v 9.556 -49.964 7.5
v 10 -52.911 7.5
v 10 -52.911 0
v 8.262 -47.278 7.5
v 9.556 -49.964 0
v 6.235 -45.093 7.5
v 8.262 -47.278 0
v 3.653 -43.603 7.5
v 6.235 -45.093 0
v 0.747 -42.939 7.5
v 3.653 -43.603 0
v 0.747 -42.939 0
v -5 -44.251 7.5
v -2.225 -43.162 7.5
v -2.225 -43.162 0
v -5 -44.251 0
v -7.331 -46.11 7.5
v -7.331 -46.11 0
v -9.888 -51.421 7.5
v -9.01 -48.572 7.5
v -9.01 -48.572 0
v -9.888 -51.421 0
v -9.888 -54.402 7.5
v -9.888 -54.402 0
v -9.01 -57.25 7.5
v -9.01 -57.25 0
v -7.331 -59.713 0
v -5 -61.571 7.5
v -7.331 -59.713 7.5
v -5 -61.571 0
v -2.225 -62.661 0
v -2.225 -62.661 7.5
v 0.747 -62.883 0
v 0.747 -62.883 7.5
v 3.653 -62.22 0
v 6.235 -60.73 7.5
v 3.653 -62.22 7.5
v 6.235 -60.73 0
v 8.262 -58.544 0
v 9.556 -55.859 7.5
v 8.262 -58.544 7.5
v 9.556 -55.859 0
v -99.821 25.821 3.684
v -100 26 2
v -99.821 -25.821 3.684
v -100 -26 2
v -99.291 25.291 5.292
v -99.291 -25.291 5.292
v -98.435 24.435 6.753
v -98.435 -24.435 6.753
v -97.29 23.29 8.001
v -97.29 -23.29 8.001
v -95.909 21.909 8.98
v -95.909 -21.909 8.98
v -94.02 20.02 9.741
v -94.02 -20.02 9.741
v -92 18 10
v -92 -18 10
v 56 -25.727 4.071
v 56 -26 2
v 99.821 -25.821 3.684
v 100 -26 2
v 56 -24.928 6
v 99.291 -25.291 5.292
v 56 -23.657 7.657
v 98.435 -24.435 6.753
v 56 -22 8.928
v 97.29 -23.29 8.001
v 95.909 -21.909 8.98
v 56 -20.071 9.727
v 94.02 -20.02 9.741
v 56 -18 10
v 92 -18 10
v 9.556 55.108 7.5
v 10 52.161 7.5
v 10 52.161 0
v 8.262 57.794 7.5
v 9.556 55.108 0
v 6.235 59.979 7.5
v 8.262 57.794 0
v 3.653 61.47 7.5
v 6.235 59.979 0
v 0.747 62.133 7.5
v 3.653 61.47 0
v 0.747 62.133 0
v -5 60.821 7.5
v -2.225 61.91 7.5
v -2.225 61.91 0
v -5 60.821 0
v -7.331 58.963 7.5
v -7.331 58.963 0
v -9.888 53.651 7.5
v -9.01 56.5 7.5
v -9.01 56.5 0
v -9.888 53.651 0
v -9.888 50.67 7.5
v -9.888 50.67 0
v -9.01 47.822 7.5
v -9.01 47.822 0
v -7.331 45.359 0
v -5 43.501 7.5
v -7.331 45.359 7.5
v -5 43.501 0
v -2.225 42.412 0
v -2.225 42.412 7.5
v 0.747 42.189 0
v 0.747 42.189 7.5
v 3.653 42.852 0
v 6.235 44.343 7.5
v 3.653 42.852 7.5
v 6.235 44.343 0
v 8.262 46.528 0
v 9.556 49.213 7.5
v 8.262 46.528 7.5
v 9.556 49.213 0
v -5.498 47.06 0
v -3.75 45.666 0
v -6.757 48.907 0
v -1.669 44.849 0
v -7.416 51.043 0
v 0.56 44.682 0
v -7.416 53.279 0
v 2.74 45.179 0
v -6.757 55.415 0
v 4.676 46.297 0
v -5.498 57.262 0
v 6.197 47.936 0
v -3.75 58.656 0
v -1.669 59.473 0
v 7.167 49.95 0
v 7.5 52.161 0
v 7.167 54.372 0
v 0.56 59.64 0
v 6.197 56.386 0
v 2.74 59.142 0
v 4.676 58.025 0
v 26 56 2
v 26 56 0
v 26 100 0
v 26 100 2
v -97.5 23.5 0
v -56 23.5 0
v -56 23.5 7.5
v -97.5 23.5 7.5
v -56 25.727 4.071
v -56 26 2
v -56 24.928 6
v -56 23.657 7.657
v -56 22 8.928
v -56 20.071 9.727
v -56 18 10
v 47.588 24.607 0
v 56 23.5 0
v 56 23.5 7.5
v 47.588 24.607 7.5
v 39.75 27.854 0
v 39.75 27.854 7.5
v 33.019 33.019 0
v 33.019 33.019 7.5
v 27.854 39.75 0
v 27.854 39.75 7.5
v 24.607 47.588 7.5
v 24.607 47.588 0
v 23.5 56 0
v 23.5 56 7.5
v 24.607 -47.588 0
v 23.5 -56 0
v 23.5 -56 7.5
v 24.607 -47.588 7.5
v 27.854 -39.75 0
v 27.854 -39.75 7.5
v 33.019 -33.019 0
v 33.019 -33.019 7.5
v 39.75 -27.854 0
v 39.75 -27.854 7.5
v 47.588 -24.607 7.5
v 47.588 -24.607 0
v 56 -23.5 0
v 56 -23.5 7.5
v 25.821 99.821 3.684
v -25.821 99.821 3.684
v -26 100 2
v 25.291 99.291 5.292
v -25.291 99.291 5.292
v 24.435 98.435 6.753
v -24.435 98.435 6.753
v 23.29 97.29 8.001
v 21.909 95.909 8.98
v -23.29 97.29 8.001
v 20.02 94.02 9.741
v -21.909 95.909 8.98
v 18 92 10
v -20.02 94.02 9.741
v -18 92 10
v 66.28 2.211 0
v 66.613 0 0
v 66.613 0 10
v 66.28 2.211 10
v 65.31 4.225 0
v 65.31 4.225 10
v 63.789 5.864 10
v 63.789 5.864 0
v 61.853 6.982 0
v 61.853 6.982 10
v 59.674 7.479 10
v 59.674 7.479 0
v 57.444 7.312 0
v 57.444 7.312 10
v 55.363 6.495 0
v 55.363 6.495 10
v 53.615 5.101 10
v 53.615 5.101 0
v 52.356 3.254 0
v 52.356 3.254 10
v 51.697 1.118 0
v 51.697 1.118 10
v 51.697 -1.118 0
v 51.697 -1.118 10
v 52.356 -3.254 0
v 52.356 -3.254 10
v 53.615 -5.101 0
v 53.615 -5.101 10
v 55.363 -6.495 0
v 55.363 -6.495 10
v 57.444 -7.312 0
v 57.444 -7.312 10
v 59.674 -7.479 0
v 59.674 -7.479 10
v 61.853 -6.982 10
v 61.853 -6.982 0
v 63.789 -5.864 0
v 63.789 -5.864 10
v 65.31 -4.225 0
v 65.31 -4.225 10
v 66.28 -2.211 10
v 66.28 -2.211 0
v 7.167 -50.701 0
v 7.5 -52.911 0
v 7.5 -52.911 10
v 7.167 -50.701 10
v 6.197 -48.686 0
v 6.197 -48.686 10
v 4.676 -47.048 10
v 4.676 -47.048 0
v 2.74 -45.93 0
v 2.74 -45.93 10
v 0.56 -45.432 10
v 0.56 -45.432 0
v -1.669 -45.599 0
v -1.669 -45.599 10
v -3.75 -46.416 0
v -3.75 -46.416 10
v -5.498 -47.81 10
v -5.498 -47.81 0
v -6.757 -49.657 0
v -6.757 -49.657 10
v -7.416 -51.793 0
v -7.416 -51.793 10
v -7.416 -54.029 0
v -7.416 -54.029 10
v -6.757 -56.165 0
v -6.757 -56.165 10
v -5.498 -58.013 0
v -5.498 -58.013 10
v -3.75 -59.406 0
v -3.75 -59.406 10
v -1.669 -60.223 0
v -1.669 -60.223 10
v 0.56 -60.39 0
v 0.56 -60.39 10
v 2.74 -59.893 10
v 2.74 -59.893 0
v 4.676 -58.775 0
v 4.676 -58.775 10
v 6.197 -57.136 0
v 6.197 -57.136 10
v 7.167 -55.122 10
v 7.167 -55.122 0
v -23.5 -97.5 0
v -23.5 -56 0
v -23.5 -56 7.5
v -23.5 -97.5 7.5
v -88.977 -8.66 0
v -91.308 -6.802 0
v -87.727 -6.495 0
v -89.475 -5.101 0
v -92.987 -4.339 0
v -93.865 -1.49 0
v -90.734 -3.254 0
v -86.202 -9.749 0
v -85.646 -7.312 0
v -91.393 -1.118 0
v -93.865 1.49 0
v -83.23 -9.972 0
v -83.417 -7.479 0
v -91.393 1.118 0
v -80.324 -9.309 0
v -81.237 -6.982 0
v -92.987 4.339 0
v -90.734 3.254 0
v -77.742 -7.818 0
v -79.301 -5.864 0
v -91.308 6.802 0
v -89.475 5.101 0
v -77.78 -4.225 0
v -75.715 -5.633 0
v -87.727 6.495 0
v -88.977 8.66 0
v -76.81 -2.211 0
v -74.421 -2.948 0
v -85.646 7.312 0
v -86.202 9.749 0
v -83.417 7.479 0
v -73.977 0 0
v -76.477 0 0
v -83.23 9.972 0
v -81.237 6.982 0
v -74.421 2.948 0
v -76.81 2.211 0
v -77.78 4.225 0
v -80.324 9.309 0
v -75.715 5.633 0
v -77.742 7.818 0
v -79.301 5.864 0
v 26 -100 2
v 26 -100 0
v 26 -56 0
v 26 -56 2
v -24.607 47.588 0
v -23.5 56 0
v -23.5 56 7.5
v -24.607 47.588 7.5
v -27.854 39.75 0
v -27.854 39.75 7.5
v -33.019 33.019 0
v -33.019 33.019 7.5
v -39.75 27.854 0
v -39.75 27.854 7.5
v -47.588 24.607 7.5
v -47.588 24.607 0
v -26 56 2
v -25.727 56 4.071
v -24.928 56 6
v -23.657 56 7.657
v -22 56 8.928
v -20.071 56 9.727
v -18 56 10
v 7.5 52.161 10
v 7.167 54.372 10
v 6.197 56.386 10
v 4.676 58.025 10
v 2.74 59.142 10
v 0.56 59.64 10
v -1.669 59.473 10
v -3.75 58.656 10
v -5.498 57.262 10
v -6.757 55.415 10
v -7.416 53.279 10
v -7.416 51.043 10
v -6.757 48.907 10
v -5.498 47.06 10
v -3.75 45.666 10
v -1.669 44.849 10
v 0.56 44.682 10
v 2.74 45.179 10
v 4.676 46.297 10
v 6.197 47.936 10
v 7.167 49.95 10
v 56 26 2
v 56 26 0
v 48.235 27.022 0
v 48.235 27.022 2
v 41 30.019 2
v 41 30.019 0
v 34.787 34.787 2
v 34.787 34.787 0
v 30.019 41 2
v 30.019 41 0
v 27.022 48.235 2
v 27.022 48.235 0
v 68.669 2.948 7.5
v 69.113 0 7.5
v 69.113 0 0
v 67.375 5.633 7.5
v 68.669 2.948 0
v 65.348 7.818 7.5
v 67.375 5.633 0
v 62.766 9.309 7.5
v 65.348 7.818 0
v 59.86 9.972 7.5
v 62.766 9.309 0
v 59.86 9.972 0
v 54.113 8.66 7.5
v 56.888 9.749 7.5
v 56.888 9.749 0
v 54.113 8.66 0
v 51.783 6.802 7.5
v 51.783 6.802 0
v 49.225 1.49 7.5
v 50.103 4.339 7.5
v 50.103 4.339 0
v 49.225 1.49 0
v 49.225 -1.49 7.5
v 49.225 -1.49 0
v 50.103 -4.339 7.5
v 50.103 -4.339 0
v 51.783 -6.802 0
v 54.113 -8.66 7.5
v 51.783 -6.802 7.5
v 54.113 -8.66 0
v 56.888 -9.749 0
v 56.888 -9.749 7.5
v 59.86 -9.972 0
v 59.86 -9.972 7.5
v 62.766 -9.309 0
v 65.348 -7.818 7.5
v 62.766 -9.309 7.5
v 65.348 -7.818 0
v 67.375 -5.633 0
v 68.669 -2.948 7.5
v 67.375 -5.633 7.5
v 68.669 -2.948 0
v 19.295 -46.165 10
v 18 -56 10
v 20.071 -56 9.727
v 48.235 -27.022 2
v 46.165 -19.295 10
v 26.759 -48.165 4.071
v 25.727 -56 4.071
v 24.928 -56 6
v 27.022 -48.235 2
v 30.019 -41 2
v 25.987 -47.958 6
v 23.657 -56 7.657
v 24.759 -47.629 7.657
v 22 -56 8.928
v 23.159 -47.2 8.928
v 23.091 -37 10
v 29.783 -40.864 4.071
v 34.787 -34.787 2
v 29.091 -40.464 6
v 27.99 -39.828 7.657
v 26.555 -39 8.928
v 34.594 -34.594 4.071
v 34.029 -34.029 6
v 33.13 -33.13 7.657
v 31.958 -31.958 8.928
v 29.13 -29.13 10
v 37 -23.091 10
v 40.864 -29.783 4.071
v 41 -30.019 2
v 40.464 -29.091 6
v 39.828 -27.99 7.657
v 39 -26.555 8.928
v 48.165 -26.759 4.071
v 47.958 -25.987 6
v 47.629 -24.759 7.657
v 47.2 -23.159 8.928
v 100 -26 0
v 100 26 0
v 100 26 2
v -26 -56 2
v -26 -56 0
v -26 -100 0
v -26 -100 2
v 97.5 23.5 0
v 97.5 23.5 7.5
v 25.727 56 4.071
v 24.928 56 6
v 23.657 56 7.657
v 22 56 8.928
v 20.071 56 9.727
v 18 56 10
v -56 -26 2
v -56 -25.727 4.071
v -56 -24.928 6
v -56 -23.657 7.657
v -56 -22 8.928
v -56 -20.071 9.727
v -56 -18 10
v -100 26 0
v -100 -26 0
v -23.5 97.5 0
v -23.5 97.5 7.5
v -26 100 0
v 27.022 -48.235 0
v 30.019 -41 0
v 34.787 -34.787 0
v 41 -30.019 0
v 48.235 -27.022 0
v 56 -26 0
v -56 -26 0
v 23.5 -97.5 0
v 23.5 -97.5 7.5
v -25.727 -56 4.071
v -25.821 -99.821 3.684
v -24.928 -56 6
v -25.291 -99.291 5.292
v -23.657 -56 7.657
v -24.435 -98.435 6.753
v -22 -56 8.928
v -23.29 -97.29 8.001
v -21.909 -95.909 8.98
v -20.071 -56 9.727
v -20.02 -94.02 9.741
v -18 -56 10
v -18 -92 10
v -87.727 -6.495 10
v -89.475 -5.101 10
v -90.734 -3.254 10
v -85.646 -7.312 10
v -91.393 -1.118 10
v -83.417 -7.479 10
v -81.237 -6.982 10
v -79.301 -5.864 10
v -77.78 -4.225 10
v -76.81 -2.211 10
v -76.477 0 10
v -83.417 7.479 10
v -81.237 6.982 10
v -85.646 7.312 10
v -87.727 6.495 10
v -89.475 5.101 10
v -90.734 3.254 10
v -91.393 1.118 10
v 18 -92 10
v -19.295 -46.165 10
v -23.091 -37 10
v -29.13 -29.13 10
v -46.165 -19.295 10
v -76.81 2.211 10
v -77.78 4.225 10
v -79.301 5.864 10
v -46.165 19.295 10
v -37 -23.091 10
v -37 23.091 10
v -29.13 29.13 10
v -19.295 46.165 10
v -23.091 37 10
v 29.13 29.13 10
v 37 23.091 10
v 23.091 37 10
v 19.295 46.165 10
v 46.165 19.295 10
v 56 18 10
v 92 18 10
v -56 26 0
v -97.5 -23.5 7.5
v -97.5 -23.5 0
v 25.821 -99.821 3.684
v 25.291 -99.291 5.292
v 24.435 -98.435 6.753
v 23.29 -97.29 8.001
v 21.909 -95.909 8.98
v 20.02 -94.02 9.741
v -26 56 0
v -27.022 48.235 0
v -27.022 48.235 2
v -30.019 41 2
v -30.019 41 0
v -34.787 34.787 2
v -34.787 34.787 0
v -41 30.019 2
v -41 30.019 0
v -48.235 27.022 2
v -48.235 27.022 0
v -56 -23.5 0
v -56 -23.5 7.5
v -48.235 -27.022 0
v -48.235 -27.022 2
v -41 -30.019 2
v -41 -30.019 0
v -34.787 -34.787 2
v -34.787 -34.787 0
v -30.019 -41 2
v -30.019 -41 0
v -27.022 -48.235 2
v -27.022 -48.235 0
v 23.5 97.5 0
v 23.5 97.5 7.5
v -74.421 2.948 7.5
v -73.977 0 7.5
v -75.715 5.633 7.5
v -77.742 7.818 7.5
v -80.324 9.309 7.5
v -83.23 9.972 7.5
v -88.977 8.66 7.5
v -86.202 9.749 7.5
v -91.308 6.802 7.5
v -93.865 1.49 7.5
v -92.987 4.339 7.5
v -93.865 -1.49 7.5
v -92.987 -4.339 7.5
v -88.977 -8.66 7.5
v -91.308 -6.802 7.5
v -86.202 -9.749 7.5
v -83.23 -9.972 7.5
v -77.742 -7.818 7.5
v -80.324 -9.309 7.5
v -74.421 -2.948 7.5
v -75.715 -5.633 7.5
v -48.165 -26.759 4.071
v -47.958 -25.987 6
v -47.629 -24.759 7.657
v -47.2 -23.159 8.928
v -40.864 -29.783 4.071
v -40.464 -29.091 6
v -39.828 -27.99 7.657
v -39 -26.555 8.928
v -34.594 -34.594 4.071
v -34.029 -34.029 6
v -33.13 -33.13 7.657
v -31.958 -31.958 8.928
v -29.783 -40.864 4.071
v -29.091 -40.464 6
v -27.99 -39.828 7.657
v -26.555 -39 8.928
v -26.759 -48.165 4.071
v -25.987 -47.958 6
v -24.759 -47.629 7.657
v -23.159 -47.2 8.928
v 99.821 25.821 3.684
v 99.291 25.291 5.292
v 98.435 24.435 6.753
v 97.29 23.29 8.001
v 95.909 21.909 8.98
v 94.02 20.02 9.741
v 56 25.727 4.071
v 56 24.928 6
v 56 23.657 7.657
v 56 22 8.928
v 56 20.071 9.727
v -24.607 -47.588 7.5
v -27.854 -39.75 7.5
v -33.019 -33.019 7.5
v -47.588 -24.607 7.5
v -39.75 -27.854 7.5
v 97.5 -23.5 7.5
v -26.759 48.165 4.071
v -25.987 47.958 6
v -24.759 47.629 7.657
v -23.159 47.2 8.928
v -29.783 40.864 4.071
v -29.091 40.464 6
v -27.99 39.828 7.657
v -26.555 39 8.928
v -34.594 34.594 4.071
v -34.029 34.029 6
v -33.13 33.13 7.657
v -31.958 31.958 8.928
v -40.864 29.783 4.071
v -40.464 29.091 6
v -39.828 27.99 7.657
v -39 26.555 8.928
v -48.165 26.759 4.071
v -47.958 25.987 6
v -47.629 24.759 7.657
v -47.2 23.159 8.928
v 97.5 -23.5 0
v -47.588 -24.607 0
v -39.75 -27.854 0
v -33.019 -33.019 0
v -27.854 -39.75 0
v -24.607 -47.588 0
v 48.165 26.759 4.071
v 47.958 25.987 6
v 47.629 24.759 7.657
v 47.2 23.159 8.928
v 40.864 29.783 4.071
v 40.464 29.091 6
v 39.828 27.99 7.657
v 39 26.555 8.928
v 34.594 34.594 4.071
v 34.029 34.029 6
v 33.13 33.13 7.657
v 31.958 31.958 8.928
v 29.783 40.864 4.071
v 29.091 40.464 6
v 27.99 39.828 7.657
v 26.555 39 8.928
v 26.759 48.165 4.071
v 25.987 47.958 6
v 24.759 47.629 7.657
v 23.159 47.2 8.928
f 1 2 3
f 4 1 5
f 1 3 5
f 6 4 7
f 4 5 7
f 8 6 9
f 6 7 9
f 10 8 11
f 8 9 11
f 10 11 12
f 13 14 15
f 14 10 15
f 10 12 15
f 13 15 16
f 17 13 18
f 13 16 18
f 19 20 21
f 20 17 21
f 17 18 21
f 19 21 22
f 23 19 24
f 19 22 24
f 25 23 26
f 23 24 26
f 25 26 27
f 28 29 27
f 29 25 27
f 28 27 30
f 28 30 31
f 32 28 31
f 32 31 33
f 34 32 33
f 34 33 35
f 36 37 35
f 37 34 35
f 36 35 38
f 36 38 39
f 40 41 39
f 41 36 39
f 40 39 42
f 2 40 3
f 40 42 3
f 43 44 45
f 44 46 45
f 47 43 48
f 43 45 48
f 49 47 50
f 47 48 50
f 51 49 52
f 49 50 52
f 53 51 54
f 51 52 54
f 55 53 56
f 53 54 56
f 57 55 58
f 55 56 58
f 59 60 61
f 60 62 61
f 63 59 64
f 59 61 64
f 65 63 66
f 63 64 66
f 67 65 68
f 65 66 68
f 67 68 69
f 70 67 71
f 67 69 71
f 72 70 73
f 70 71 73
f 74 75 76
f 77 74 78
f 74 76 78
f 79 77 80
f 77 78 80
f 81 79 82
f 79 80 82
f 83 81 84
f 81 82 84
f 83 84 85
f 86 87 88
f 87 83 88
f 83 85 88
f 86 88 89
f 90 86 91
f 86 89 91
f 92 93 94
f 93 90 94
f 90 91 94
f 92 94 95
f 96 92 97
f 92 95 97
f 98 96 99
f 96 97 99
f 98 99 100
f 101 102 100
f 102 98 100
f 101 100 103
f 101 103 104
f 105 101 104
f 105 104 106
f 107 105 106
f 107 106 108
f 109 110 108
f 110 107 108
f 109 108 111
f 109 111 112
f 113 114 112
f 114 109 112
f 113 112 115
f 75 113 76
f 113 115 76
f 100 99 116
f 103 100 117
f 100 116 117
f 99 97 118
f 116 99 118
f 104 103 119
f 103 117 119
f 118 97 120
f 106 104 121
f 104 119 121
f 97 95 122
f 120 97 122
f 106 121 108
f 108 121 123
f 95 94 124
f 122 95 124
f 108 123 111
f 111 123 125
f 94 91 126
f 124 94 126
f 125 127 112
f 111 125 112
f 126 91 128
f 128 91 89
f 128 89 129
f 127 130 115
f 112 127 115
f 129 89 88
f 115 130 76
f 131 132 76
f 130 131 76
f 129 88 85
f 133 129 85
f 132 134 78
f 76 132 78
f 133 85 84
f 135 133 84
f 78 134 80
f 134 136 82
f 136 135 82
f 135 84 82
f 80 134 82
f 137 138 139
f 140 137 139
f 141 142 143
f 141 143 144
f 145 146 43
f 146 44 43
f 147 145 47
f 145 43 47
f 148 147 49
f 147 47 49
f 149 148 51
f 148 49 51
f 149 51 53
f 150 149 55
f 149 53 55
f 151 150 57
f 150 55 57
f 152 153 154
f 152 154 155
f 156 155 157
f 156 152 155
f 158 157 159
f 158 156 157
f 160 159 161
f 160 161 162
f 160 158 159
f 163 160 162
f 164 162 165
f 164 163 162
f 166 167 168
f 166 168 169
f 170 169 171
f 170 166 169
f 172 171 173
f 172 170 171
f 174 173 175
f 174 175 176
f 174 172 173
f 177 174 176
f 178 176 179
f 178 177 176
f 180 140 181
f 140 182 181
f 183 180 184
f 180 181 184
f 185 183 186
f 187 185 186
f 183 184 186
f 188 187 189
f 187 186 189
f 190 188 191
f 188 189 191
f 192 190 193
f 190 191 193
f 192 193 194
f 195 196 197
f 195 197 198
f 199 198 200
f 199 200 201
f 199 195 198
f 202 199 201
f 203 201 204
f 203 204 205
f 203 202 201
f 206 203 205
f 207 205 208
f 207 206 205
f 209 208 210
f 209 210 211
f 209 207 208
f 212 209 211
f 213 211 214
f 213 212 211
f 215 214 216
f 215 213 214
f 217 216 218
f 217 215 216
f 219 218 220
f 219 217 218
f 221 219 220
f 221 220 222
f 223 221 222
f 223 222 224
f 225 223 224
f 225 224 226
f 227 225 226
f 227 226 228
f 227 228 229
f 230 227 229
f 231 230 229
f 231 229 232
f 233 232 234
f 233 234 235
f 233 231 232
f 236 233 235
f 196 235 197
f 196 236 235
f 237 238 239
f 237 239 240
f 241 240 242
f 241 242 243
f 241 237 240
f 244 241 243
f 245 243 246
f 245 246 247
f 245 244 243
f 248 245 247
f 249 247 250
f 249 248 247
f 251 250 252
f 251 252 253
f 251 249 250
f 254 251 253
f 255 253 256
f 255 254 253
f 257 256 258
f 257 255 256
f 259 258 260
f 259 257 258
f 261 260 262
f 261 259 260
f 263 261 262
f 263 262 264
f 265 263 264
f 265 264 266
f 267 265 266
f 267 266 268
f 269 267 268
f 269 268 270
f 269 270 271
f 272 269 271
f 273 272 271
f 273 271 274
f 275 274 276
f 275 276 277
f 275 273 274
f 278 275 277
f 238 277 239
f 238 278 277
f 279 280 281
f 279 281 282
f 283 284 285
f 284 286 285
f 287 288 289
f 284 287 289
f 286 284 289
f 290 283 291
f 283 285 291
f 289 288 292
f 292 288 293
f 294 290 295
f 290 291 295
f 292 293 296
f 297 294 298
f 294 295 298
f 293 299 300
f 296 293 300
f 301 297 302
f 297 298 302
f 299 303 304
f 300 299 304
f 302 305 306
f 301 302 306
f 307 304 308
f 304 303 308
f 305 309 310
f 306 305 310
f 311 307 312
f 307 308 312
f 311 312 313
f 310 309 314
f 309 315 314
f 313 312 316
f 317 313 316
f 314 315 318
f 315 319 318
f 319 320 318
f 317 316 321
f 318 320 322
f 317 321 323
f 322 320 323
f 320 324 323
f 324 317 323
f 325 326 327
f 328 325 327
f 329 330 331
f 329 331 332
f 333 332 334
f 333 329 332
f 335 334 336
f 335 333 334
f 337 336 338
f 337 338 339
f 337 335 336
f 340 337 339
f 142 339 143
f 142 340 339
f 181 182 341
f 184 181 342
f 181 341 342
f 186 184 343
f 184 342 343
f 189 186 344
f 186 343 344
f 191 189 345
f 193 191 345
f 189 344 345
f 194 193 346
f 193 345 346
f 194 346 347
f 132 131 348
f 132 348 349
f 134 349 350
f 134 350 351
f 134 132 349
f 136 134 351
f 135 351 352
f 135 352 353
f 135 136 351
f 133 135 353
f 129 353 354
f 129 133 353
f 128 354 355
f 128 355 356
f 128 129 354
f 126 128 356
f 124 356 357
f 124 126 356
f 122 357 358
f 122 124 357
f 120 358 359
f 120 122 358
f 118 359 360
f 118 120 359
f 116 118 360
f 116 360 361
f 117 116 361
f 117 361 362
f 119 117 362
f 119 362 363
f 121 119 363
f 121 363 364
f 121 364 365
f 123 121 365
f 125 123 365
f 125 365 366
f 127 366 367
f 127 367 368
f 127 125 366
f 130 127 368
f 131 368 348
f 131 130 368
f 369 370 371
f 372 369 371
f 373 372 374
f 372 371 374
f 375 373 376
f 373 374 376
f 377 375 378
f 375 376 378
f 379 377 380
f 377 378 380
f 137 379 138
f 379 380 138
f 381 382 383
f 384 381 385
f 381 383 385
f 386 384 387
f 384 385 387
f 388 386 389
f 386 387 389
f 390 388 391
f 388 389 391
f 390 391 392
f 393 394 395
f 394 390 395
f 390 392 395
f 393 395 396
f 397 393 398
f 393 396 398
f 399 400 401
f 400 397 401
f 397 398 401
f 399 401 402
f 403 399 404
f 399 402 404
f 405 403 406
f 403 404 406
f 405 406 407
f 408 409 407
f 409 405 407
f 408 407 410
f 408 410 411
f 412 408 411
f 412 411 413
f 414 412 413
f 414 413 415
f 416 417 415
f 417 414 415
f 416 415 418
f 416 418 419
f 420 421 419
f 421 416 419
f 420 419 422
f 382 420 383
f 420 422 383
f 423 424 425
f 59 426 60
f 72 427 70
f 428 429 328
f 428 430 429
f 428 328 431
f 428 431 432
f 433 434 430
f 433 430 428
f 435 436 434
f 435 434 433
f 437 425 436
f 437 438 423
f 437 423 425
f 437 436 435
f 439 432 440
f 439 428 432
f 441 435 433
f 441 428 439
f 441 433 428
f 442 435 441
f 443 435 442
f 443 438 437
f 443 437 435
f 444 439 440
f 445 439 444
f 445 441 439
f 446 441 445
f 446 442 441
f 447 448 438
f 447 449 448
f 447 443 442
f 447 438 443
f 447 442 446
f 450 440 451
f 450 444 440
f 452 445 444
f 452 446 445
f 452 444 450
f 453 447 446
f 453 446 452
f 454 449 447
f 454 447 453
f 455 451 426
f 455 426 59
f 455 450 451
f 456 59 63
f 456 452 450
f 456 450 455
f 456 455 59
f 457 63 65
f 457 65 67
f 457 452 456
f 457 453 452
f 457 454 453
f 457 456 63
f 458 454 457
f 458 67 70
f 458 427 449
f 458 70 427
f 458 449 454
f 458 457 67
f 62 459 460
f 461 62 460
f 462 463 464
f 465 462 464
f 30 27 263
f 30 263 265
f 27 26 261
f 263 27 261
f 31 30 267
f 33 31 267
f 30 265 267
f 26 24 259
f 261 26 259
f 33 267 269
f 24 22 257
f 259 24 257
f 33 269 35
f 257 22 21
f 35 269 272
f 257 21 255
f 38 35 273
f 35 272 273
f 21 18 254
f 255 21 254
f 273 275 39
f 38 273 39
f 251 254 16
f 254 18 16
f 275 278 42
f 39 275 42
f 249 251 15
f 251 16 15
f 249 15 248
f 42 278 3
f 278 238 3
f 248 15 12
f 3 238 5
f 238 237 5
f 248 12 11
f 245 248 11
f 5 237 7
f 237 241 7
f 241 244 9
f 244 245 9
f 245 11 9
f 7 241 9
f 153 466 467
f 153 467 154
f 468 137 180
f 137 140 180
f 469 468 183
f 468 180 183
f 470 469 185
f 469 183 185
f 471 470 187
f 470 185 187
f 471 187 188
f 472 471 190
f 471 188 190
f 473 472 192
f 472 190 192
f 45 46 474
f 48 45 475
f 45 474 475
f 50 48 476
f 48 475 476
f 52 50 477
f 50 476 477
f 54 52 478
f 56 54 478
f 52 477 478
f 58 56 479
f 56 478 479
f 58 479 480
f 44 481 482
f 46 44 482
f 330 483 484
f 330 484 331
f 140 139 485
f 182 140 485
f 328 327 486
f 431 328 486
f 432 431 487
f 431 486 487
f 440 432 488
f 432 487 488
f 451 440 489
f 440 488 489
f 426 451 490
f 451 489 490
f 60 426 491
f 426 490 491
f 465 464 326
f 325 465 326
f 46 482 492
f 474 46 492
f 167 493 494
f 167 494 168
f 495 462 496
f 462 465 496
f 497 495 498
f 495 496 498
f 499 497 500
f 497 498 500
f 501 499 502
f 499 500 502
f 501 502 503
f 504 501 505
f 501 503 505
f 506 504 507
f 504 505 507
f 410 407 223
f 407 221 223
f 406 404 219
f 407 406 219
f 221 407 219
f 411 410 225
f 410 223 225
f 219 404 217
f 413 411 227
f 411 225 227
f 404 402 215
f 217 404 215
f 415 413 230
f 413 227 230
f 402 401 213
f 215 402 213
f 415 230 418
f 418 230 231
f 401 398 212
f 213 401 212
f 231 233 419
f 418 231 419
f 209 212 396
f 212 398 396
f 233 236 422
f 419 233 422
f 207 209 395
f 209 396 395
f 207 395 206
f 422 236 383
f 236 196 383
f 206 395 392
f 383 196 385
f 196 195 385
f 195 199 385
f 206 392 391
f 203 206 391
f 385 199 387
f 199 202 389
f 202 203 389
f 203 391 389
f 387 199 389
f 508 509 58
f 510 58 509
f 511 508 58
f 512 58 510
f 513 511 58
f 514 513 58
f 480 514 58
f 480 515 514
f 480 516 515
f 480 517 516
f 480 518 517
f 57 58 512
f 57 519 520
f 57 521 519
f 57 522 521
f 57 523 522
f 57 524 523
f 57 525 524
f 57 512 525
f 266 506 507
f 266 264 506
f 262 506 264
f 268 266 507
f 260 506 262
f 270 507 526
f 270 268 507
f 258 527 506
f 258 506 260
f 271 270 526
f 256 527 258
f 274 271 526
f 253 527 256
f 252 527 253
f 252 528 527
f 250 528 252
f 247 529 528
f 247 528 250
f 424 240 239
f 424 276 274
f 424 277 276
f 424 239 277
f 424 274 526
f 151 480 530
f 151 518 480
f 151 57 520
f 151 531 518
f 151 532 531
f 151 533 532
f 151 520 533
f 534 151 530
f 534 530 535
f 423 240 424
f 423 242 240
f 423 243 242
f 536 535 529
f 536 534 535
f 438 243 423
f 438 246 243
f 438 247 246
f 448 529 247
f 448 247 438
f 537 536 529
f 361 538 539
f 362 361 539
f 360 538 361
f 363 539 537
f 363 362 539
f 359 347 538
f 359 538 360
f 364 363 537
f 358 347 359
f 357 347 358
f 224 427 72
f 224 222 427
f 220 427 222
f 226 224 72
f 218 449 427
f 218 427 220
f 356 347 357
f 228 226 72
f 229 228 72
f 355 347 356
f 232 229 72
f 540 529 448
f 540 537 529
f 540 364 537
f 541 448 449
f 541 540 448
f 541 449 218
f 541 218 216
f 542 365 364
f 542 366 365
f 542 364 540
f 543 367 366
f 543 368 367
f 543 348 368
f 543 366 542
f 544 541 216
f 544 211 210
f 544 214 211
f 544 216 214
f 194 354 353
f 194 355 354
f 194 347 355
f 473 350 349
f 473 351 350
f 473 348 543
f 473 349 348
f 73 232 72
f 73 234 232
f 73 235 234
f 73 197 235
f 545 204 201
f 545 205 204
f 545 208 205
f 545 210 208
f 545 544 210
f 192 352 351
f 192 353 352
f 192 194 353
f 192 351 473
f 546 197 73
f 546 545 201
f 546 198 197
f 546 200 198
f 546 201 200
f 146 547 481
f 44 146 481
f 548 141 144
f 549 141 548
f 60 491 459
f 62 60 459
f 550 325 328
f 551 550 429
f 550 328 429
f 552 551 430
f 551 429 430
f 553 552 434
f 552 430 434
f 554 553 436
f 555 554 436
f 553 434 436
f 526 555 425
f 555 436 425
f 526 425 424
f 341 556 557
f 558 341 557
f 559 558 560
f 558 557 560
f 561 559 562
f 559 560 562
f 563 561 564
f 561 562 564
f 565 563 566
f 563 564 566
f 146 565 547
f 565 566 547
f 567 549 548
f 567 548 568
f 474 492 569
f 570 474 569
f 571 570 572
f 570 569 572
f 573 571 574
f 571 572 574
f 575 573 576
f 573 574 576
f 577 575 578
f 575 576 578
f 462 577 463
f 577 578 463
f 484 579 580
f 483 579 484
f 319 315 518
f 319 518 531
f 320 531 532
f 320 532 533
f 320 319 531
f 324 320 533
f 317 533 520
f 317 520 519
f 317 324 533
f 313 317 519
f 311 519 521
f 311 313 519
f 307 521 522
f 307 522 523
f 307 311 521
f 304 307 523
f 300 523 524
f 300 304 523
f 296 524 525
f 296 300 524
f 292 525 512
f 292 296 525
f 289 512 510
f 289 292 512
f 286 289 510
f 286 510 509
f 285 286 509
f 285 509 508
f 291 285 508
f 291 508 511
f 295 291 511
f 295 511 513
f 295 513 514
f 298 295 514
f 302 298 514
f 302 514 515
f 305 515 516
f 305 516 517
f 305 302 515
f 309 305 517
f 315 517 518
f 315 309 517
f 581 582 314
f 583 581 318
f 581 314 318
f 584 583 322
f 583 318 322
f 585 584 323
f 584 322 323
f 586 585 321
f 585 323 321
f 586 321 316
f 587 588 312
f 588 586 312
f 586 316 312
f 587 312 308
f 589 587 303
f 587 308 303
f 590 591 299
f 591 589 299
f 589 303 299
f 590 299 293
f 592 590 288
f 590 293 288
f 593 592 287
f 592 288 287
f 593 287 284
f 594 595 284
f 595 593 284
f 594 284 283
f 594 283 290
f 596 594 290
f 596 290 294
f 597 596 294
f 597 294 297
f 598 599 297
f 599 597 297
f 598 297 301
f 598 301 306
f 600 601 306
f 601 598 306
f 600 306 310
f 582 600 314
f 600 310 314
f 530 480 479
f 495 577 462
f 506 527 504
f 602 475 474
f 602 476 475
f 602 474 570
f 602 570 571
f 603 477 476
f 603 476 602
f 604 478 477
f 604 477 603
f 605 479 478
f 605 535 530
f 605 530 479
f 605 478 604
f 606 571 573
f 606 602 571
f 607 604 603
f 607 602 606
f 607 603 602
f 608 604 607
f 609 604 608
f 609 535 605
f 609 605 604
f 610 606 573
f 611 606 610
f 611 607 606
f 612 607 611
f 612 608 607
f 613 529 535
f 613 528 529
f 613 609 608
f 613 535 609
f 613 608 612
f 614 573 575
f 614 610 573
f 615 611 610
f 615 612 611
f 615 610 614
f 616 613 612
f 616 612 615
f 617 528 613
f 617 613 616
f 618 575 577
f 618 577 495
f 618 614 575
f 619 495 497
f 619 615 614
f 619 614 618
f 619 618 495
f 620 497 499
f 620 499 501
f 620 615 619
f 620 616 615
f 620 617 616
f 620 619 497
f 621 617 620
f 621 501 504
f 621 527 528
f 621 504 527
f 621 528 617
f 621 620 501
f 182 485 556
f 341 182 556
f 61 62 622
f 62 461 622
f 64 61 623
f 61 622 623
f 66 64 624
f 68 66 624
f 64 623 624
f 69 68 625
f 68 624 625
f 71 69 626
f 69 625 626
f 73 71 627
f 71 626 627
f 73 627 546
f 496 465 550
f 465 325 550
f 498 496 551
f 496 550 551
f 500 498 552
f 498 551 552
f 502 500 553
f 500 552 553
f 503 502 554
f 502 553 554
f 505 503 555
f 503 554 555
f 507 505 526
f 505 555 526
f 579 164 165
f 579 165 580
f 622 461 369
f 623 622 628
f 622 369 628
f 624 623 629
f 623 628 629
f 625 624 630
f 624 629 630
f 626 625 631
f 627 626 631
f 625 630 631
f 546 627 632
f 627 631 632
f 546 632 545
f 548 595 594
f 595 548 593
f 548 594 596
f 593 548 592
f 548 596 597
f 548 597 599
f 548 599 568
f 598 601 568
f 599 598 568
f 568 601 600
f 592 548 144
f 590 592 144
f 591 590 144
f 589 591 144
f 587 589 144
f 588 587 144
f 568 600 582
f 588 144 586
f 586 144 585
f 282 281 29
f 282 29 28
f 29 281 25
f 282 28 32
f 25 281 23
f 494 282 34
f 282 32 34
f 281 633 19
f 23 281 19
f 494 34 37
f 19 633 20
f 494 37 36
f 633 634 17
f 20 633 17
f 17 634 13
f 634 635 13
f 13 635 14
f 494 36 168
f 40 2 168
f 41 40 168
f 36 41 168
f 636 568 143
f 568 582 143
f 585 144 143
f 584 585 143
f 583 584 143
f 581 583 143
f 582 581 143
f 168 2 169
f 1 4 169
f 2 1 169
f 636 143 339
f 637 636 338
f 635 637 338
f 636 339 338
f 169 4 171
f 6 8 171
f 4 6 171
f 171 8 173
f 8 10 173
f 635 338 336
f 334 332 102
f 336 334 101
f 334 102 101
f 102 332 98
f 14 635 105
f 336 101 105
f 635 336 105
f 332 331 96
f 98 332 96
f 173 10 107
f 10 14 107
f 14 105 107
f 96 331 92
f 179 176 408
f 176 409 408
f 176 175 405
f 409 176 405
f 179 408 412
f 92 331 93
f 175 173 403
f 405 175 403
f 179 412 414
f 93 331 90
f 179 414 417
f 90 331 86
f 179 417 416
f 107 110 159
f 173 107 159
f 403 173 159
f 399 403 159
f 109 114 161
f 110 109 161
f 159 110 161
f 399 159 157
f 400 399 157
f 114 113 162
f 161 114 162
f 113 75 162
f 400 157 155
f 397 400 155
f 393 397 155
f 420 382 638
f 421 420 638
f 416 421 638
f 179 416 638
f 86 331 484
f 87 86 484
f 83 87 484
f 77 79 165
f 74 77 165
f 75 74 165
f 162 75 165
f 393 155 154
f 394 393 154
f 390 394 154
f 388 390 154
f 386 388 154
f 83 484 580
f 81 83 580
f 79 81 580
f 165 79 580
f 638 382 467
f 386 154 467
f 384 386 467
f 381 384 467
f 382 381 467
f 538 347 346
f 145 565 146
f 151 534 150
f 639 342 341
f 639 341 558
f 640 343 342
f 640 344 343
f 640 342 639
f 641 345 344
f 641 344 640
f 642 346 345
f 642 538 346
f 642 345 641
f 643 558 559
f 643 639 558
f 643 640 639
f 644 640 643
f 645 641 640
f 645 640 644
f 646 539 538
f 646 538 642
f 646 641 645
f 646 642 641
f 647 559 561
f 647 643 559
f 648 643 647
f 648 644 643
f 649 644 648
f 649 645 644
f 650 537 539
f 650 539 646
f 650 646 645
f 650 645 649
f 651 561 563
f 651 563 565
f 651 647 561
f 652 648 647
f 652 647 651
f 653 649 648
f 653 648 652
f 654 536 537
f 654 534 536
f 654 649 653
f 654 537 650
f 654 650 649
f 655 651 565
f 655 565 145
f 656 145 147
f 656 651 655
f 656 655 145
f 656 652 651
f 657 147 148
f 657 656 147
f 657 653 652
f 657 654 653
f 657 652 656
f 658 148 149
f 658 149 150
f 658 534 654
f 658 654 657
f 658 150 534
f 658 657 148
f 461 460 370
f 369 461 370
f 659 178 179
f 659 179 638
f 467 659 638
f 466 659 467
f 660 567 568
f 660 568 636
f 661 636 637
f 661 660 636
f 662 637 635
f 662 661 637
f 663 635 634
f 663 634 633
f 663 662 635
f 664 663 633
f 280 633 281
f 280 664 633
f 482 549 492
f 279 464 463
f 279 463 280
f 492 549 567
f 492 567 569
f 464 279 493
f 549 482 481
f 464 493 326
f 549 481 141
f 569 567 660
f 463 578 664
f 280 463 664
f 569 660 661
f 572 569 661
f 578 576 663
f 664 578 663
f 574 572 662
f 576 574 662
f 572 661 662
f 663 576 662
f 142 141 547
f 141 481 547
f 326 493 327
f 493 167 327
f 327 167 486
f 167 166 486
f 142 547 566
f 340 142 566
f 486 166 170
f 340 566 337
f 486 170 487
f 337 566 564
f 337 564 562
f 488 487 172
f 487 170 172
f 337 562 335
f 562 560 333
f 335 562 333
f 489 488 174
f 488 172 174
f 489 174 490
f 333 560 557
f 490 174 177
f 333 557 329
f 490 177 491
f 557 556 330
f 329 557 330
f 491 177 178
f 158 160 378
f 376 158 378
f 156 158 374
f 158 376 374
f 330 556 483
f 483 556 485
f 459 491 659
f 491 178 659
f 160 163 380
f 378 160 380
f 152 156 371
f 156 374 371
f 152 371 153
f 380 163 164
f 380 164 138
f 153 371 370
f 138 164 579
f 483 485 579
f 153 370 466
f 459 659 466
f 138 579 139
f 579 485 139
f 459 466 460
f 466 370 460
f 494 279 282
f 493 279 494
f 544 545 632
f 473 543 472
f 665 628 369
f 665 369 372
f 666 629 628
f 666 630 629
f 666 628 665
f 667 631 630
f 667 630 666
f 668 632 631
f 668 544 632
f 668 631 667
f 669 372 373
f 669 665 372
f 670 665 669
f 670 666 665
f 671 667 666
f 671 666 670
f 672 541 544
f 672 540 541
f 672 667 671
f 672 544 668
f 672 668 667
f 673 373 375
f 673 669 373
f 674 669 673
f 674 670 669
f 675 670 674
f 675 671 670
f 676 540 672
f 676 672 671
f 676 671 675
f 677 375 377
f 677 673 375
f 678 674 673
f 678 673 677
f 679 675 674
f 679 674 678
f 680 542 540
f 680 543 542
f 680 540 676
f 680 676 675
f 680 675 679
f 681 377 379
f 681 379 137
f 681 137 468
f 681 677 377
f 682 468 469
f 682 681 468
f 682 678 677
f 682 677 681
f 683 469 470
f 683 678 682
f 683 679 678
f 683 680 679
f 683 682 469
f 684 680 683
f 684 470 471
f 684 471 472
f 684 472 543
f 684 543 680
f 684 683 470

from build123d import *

# Parameters (mm, degrees)
F0_R     = 7.5
F0_W     = 52
F0_H     = 52
F1_DEPTH = 10
F2_T     = -2.5
F3_R     = 8


with BuildPart() as f1:
    # F0 (on Top) → F1 (new body)
    with BuildSketch(Plane.XY):
        Polygon((-26, -100), (26, -100), (26, -56), (26, -26), (-26, -26), (-26, -56), align=None)
        with Locations((0, -52.9112443328)):
            Circle(F0_R, mode=Mode.SUBTRACT)
        with BuildLine():
            Line((26, -26), (26, -56))
            ThreePointArc((26, -56), (34.7867965644, -34.7867965644), (56, -26))
            Line((56, -26), (26, -26))
        make_face()
        with BuildLine():
            ThreePointArc((-56, -26), (-34.7867965644, -34.7867965644), (-26, -56))
            Line((-26, -56), (-26, -26))
            Line((-26, -26), (-56, -26))
        make_face()
        Polygon((26, 26), (26, -26), (56, -26), (100, -26), (100, 26), (56, 26), align=None)
        with Locations((59.1130256653, 0)):
            Circle(F0_R, mode=Mode.SUBTRACT)
        Polygon((-56, -26), (-26, -26), (-26, 26), (-56, 26), (-100, 26), (-100, -26), align=None)
        with Locations((-83.977087408, 0)):
            Circle(F0_R, mode=Mode.SUBTRACT)
        Polygon((-26, 26), (26, 26), (26, 56), (26, 100), (-26, 100), (-26, 56), align=None)
        with Locations((0, 52.160911262)):
            Circle(F0_R, mode=Mode.SUBTRACT)
        with BuildLine():
            Line((26, 56), (26, 26))
            Line((26, 26), (56, 26))
            ThreePointArc((56, 26), (34.7867965644, 34.7867965644), (26, 56))
        make_face()
        with BuildLine():
            Line((-56, 26), (-26, 26))
            Line((-26, 26), (-26, 56))
            ThreePointArc((-26, 56), (-34.7867965644, 34.7867965644), (-56, 26))
        make_face()
        Rectangle(F0_W, F0_H)
    extrude(amount=F1_DEPTH)

    # F2
    f2_openings = [f1.faces().sort_by_distance(p)[0] for p in [
        (0.241929, 0.007301, 0),
    ]]
    offset(amount=F2_T, openings=f2_openings)

    # F3
    f3_edges = [f1.edges().sort_by_distance(p)[0] for p in [
        (34.786797, 34.786797, 10),
        (100, 0, 10),
        (78, -26, 10),
        (34.786797, -34.786797, 10),
        (0, 100, 10),
        (-26, 78, 10),
        (-34.786797, -34.786797, 10),
        (-100, 0, 10),
        (0, -100, 10),
    ]]
    fillet(f3_edges, radius=F3_R)


solid = f1.part
